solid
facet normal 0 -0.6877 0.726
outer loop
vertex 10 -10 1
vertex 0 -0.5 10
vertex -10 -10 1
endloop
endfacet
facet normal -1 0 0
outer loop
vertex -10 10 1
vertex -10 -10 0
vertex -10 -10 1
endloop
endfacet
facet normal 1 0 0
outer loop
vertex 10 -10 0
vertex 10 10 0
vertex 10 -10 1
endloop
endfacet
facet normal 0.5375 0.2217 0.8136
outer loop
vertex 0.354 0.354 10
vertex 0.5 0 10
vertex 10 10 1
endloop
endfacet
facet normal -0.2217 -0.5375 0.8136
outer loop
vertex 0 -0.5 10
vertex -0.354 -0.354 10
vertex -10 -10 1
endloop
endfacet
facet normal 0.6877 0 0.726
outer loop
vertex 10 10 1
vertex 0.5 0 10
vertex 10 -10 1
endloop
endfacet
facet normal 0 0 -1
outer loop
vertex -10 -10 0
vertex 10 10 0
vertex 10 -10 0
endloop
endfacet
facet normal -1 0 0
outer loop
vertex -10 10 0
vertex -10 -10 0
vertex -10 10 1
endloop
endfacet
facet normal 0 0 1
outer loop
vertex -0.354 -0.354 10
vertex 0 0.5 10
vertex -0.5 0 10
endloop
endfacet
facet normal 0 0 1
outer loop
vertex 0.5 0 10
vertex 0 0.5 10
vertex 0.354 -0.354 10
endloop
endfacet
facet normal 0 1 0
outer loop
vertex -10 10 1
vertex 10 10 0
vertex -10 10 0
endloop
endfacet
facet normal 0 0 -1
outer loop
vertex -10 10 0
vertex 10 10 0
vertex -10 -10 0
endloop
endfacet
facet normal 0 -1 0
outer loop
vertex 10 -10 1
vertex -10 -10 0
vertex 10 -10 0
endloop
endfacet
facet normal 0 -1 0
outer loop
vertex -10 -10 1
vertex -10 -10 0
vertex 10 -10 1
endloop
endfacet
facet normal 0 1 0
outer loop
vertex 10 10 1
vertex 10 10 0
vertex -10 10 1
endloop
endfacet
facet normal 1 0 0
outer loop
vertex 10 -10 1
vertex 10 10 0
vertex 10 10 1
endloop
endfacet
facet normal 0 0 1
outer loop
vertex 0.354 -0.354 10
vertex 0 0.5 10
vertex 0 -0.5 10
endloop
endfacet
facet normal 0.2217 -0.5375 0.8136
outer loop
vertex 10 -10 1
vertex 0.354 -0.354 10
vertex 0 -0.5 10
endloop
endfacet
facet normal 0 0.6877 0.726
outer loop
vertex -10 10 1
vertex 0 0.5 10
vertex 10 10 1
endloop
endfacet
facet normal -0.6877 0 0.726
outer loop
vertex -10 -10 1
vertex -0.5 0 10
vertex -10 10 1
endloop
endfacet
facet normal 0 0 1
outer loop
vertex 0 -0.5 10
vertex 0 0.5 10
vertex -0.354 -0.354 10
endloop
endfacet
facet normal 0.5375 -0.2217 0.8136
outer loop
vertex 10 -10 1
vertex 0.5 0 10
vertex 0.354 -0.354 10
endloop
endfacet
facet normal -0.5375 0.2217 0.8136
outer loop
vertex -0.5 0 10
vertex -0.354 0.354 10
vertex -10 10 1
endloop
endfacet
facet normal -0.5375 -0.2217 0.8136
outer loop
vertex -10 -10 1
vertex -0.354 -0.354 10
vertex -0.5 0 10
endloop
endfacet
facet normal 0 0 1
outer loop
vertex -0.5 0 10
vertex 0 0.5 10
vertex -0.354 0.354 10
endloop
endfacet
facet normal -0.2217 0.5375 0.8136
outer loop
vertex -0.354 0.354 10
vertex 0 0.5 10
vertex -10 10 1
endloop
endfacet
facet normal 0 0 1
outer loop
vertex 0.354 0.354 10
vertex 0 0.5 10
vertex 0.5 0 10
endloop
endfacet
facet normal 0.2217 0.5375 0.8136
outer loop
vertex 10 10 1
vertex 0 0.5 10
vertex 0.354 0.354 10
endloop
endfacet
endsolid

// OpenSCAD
// Simple cooling test

hull() {
  translate([0,0,0.5]) cube([20,20,1.0],center=true);
  cylinder($fn=8,r=0.5,h=10,center=false);
}
